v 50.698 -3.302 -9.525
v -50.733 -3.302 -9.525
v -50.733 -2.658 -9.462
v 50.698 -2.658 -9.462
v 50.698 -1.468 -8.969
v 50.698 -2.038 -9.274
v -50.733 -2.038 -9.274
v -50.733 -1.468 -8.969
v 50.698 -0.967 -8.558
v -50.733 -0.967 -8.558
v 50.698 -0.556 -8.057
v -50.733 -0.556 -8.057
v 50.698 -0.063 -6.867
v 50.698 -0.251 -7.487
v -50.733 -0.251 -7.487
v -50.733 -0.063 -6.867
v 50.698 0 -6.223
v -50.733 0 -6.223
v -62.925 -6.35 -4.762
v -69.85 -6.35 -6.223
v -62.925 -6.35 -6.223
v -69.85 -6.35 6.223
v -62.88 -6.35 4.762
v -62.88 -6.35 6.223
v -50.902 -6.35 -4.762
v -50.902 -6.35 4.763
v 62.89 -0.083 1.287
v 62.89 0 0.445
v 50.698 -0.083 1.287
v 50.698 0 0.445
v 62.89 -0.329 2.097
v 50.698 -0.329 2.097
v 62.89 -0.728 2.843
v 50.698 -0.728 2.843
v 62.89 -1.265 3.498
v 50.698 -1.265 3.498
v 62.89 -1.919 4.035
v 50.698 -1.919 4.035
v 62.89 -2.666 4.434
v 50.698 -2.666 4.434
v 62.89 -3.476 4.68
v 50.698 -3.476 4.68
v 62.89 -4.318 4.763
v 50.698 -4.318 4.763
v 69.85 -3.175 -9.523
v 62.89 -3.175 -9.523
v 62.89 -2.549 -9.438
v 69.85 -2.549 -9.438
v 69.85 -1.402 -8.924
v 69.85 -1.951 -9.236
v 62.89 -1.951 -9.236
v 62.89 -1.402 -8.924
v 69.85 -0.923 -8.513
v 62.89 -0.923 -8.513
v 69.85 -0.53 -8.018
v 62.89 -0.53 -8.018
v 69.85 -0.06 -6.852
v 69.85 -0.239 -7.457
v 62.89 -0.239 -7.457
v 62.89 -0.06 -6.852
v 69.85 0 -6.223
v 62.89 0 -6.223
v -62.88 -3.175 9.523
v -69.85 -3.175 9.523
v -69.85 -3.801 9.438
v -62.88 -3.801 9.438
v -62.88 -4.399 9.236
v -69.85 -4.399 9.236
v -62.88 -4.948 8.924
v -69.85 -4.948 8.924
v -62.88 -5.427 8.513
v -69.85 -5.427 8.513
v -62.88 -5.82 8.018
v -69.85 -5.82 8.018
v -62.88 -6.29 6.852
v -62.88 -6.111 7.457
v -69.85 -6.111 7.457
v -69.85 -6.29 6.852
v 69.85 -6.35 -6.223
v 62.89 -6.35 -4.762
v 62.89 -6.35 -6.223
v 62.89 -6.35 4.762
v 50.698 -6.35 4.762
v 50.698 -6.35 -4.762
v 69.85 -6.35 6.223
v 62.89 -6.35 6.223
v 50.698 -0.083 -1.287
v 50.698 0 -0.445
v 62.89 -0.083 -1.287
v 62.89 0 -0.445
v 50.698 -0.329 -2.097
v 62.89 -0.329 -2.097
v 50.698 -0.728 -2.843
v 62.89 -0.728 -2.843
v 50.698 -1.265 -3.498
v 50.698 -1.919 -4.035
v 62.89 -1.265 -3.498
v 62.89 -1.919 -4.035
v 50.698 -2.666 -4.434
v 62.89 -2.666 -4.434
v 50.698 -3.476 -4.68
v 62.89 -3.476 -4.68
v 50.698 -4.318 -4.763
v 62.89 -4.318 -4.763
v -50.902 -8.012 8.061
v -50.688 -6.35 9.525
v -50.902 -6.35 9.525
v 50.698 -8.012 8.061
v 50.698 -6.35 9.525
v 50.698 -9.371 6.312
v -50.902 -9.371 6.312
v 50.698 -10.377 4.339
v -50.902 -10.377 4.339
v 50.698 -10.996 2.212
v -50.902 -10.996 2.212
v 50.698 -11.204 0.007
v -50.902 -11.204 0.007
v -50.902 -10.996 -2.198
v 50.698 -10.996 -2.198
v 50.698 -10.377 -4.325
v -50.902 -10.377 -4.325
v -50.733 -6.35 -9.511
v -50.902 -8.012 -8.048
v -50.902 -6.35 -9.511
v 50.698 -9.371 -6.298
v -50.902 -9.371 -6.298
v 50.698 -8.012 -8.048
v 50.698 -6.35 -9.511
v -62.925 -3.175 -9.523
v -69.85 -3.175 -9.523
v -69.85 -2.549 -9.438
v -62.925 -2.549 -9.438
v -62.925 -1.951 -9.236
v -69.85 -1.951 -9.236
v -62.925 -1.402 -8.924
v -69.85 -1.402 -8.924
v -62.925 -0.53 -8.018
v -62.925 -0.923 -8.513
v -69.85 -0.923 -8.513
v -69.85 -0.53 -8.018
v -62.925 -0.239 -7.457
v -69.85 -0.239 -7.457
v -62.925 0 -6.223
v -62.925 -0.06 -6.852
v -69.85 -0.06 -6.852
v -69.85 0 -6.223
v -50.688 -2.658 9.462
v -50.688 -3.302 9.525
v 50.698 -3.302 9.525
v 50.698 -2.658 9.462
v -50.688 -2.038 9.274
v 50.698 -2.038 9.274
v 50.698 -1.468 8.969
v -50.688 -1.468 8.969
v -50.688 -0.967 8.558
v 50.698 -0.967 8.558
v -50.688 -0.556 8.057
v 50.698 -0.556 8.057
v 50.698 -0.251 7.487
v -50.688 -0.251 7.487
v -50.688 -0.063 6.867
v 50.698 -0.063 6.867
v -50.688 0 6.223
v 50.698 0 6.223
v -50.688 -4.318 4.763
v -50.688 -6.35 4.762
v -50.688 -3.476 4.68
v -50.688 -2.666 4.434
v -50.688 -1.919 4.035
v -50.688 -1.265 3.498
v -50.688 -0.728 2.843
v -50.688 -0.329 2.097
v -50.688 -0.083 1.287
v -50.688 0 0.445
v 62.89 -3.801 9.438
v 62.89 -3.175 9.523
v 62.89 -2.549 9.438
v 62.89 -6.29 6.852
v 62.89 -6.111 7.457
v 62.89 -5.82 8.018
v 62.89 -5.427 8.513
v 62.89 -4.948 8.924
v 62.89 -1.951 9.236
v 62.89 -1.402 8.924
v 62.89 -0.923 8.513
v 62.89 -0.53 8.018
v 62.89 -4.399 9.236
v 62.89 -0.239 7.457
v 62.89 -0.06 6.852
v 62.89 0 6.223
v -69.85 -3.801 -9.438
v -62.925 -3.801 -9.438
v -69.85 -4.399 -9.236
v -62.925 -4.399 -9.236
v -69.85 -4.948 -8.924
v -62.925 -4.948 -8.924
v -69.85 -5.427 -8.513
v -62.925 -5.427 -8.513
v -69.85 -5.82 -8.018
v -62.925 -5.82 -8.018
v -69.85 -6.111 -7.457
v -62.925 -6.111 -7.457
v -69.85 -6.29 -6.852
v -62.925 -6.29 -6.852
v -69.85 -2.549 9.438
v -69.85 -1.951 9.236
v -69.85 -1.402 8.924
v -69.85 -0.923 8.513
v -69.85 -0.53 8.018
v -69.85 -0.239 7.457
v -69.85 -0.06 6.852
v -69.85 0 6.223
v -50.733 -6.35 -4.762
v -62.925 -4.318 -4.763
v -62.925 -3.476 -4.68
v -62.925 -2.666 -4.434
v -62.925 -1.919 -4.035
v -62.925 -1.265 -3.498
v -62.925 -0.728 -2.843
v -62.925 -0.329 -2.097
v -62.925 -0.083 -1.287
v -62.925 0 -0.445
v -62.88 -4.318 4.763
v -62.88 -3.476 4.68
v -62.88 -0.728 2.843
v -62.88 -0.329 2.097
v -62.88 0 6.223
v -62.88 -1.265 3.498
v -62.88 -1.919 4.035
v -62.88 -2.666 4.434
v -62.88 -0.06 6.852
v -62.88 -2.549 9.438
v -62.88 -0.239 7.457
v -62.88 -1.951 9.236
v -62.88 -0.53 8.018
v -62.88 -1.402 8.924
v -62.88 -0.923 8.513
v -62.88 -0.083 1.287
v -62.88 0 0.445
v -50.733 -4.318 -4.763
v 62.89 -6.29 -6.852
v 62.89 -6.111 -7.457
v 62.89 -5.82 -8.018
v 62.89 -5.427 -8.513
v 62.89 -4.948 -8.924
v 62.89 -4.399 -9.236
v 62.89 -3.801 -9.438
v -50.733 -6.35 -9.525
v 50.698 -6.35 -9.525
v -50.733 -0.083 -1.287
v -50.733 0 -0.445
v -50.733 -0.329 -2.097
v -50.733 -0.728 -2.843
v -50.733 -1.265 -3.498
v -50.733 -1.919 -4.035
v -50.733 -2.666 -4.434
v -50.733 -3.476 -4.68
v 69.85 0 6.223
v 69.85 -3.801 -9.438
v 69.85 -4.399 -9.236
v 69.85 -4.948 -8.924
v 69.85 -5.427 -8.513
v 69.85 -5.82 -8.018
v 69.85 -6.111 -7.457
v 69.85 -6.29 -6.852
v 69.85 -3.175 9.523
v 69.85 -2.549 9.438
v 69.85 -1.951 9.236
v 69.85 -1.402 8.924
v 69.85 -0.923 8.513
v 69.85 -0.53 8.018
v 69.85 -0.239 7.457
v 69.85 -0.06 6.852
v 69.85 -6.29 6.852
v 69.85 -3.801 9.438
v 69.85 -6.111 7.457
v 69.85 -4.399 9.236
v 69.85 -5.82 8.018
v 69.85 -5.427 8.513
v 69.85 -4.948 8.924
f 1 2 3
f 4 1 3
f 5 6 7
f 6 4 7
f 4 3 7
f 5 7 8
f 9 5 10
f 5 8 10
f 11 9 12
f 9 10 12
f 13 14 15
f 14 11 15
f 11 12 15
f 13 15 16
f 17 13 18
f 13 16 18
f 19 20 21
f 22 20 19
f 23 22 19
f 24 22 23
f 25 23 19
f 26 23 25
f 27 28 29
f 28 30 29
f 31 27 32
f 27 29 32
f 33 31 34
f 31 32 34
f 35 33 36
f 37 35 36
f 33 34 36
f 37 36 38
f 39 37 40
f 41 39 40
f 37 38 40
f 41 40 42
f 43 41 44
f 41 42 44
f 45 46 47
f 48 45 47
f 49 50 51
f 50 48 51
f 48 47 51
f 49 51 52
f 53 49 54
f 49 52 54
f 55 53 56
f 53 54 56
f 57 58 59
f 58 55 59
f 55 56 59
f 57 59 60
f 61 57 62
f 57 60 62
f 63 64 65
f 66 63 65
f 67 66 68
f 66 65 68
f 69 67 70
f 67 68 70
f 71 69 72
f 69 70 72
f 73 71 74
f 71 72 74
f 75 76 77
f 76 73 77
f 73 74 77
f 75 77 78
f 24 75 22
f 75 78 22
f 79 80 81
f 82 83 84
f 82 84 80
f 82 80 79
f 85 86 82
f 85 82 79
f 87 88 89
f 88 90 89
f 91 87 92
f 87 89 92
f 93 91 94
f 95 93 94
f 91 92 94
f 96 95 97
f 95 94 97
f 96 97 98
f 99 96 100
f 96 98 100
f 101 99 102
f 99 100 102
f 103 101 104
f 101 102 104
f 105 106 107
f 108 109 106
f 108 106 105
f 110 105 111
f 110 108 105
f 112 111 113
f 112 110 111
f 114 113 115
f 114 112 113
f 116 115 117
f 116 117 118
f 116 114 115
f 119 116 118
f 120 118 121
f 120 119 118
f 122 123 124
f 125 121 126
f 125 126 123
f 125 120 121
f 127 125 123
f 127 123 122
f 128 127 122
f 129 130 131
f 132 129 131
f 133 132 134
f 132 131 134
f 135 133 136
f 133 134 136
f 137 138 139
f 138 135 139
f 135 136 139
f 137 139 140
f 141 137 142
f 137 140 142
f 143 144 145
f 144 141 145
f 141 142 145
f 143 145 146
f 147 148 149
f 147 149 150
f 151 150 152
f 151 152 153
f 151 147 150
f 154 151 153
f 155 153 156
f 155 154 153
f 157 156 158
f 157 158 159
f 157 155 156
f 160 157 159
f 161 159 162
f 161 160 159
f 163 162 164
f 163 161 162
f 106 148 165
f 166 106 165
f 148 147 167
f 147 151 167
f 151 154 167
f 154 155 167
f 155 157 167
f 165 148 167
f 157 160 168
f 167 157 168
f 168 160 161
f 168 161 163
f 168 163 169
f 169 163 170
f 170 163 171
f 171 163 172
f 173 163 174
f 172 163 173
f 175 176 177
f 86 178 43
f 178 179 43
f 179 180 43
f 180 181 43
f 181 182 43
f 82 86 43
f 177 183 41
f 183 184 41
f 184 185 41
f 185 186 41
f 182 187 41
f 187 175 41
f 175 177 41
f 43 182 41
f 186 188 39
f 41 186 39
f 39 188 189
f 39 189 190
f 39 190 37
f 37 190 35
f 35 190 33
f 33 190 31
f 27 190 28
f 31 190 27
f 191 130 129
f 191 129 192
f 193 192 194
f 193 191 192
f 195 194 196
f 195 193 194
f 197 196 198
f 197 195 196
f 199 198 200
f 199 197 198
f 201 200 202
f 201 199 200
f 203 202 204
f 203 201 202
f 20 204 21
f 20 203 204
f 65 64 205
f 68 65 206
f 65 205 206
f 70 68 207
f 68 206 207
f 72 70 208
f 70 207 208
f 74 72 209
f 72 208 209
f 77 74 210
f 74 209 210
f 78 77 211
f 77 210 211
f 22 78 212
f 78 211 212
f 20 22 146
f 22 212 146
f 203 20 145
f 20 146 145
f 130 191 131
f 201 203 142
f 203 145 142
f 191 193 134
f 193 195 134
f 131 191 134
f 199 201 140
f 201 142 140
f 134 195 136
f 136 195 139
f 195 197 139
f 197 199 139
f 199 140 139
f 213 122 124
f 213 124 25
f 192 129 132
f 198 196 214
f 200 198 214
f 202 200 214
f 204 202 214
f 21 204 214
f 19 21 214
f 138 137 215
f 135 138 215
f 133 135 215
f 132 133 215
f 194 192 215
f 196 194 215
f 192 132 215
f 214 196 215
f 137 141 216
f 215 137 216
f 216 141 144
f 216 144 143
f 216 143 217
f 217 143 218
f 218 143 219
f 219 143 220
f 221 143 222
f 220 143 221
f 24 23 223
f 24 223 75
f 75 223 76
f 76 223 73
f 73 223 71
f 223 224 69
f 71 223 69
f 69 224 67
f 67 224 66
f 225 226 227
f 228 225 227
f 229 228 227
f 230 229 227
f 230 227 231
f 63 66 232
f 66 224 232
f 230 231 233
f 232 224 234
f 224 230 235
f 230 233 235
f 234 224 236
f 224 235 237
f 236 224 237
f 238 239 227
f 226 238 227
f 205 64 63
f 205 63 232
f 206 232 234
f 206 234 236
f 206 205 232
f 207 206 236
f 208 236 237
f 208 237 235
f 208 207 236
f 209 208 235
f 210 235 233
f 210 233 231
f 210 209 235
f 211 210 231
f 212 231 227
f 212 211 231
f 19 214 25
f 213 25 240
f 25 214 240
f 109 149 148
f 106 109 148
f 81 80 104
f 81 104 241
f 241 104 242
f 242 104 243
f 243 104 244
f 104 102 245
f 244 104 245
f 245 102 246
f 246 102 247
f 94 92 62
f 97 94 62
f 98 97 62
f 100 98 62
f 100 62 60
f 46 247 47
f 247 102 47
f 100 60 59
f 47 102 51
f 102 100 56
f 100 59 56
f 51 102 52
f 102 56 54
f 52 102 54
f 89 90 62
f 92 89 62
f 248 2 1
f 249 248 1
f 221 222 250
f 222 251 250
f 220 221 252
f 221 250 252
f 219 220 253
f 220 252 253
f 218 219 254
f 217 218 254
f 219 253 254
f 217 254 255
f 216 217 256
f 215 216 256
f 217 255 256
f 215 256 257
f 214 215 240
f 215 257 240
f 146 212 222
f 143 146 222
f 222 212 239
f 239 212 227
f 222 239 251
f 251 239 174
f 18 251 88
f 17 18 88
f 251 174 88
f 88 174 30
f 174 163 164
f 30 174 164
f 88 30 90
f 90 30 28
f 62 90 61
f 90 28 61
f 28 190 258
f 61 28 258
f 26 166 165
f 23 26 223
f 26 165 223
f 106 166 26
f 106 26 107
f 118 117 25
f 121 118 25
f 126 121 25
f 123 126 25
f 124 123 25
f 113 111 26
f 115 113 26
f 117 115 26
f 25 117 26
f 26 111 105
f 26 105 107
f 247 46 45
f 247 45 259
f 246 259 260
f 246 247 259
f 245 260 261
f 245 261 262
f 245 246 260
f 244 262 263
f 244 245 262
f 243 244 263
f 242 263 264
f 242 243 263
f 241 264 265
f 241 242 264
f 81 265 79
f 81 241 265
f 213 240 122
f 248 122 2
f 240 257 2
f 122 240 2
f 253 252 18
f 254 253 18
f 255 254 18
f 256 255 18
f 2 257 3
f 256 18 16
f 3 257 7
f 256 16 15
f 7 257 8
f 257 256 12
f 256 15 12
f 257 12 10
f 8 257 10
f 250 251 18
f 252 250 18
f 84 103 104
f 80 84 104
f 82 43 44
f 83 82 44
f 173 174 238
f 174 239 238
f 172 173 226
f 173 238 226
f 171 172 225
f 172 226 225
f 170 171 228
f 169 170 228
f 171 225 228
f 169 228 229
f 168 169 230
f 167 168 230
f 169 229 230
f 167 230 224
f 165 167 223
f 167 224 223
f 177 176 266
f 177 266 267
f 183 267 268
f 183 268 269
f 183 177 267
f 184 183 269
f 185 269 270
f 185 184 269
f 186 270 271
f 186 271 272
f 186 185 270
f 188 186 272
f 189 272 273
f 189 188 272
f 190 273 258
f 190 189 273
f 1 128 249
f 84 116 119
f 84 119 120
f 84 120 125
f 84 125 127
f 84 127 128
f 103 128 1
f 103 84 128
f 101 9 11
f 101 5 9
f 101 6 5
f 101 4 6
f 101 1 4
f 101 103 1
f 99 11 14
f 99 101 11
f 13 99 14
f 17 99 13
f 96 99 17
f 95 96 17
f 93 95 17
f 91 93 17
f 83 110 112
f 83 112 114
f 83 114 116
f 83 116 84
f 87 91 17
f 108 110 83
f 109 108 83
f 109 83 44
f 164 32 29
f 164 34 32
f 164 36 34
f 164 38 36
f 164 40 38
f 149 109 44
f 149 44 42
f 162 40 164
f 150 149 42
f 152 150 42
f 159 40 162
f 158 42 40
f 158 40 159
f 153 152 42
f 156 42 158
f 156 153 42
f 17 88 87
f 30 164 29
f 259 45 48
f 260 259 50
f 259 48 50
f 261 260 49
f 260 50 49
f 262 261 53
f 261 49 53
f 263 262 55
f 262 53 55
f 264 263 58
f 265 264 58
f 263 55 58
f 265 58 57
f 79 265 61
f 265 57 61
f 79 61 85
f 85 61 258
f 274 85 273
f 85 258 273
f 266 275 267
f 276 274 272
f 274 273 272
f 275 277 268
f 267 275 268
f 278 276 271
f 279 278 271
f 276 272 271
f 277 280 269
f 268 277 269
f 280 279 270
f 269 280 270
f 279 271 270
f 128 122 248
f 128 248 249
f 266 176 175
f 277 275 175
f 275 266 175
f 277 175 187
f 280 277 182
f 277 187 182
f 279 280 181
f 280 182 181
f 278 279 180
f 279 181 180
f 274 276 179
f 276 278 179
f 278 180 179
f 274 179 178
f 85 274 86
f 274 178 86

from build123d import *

# Parameters (mm, degrees)
F1_DEPTH    = 6.35
F2_T1_DEPTH = 23.4696
F2_T3_DEPTH = 117.8964839186
F2_T5_DEPTH = 23.4799160814
F2_T7_DEPTH = 117.9413513149
F2_T9_DEPTH = 23.4350486851
F3_R        = 4.318
F5_DEPTH    = 101.6


# Not quite as in the source:
# - a fillet or chamfer that OpenCascade refuses, or shapes differently, is made with other operations: its cross-section is extruded or revolved along the edge and cut away or added


with BuildPart() as f1:
    # F0 (on Front) → F1 (new body)
    with BuildSketch(Plane.XZ):
        Polygon((69.85, -9.525), (69.85, 9.525), (62.8904, 9.525), (62.8904, 4.7625), (50.6984, 4.7625), (50.6984, 9.525), (-50.6880839186, 9.525), (-50.6880839186, 4.7625), (-62.8800839186, 4.7625), (-62.8800839186, 9.525), (-69.85, 9.525), (-69.85, -9.525), (-62.9249513149, -9.525), (-62.9249513149, -4.7625), (-50.7329513149, -4.7625), (-50.7329513149, -9.525), (50.6984, -9.525), (50.6984, -4.7625), (62.8904, -4.7625), (62.8904, -9.525), align=None)
    extrude(amount=F1_DEPTH)

    # F2: fillet of radius 3.302 on 10 edges, made by hand

    # F2_s2 → F2_t1 (cut)
    with BuildSketch(Plane.YZ.offset(54.6354)):
        with BuildLine():
            ThreePointArc((-3.302, 9.525), (-0.9671334085, 8.5578665915), (0, 6.223))
            Line((0, 6.223), (0, 9.525))
            Line((0, 9.525), (-3.302, 9.525))
        make_face()
        with BuildLine():
            ThreePointArc((-3.048, 9.525), (-5.3828665915, 8.5578665915), (-6.35, 6.223))
            Line((-6.35, 6.223), (-6.35, 9.525))
            Line((-6.35, 9.525), (-3.048, 9.525))
        make_face()
        with BuildLine():
            ThreePointArc((-3.302, -9.525), (-0.9671334085, -8.5578665915), (0, -6.223))
            Line((0, -6.223), (0, -9.525))
            Line((0, -9.525), (-3.302, -9.525))
        make_face()
        with BuildLine():
            ThreePointArc((-3.048, -9.525), (-5.3828665915, -8.5578665915), (-6.35, -6.223))
            Line((-6.35, -6.223), (-6.35, -9.525))
            Line((-6.35, -9.525), (-3.048, -9.525))
        make_face()
    extrude(amount=F2_T1_DEPTH, mode=Mode.SUBTRACT)

    # F2_s4 → F2_t3 (cut)
    with BuildSketch(Plane.YZ.offset(-58.9430839186)):
        with BuildLine():
            ThreePointArc((-3.302, 9.525), (-0.9671334085, 8.5578665915), (0, 6.223))
            Line((0, 6.223), (0, 9.525))
            Line((0, 9.525), (-3.302, 9.525))
        make_face()
    extrude(amount=F2_T3_DEPTH, mode=Mode.SUBTRACT)

    # F2_s6 → F2_t5 (cut)
    with BuildSketch(Plane.YZ.offset(-78.105)):
        with BuildLine():
            ThreePointArc((-3.302, 9.525), (-0.9671334085, 8.5578665915), (0, 6.223))
            Line((0, 6.223), (0, 9.525))
            Line((0, 9.525), (-3.302, 9.525))
        make_face()
        with BuildLine():
            ThreePointArc((-3.048, 9.525), (-5.3828665915, 8.5578665915), (-6.35, 6.223))
            Line((-6.35, 6.223), (-6.35, 9.525))
            Line((-6.35, 9.525), (-3.048, 9.525))
        make_face()
    extrude(amount=F2_T5_DEPTH, mode=Mode.SUBTRACT)

    # F2_s8 → F2_t7 (cut)
    with BuildSketch(Plane.YZ.offset(-58.9879513149)):
        with BuildLine():
            ThreePointArc((-3.302, -9.525), (-0.9671334085, -8.5578665915), (0, -6.223))
            Line((0, -6.223), (0, -9.525))
            Line((0, -9.525), (-3.302, -9.525))
        make_face()
    extrude(amount=F2_T7_DEPTH, mode=Mode.SUBTRACT)

    # F2_s10 → F2_t9 (cut)
    with BuildSketch(Plane.YZ.offset(-78.105)):
        with BuildLine():
            ThreePointArc((-3.302, -9.525), (-0.9671334085, -8.5578665915), (0, -6.223))
            Line((0, -6.223), (0, -9.525))
            Line((0, -9.525), (-3.302, -9.525))
        make_face()
        with BuildLine():
            ThreePointArc((-3.048, -9.525), (-5.3828665915, -8.5578665915), (-6.35, -6.223))
            Line((-6.35, -6.223), (-6.35, -9.525))
            Line((-6.35, -9.525), (-3.048, -9.525))
        make_face()
    extrude(amount=F2_T9_DEPTH, mode=Mode.SUBTRACT)

    # F3
    f3_edges = [f1.edges().sort_by_distance(p)[0] for p in [
        (-56.784084, 0, 4.7625),
        (-56.828951, 0, -4.7625),
        (56.7944, 0, -4.7625),
        (56.7944, 0, 4.7625),
    ]]
    fillet(f3_edges, radius=F3_R)

    # F4 (on face) → F5 (join)
    with BuildSketch(Plane.YZ.offset(50.6984)):
        with BuildLine():
            Line((-6.35, 4.7625), (-6.35, 9.525))
            ThreePointArc((-6.35, 9.525), (-11.2043924939, 0.0067562208), (-6.35, -9.5114875585))
            Line((-6.35, -9.5114875585), (-6.35, -4.8156534322))
            Line((-6.35, -4.8156534322), (-6.35, 4.7625))
        make_face()
    extrude(amount=-F5_DEPTH)


solid = f1.part
